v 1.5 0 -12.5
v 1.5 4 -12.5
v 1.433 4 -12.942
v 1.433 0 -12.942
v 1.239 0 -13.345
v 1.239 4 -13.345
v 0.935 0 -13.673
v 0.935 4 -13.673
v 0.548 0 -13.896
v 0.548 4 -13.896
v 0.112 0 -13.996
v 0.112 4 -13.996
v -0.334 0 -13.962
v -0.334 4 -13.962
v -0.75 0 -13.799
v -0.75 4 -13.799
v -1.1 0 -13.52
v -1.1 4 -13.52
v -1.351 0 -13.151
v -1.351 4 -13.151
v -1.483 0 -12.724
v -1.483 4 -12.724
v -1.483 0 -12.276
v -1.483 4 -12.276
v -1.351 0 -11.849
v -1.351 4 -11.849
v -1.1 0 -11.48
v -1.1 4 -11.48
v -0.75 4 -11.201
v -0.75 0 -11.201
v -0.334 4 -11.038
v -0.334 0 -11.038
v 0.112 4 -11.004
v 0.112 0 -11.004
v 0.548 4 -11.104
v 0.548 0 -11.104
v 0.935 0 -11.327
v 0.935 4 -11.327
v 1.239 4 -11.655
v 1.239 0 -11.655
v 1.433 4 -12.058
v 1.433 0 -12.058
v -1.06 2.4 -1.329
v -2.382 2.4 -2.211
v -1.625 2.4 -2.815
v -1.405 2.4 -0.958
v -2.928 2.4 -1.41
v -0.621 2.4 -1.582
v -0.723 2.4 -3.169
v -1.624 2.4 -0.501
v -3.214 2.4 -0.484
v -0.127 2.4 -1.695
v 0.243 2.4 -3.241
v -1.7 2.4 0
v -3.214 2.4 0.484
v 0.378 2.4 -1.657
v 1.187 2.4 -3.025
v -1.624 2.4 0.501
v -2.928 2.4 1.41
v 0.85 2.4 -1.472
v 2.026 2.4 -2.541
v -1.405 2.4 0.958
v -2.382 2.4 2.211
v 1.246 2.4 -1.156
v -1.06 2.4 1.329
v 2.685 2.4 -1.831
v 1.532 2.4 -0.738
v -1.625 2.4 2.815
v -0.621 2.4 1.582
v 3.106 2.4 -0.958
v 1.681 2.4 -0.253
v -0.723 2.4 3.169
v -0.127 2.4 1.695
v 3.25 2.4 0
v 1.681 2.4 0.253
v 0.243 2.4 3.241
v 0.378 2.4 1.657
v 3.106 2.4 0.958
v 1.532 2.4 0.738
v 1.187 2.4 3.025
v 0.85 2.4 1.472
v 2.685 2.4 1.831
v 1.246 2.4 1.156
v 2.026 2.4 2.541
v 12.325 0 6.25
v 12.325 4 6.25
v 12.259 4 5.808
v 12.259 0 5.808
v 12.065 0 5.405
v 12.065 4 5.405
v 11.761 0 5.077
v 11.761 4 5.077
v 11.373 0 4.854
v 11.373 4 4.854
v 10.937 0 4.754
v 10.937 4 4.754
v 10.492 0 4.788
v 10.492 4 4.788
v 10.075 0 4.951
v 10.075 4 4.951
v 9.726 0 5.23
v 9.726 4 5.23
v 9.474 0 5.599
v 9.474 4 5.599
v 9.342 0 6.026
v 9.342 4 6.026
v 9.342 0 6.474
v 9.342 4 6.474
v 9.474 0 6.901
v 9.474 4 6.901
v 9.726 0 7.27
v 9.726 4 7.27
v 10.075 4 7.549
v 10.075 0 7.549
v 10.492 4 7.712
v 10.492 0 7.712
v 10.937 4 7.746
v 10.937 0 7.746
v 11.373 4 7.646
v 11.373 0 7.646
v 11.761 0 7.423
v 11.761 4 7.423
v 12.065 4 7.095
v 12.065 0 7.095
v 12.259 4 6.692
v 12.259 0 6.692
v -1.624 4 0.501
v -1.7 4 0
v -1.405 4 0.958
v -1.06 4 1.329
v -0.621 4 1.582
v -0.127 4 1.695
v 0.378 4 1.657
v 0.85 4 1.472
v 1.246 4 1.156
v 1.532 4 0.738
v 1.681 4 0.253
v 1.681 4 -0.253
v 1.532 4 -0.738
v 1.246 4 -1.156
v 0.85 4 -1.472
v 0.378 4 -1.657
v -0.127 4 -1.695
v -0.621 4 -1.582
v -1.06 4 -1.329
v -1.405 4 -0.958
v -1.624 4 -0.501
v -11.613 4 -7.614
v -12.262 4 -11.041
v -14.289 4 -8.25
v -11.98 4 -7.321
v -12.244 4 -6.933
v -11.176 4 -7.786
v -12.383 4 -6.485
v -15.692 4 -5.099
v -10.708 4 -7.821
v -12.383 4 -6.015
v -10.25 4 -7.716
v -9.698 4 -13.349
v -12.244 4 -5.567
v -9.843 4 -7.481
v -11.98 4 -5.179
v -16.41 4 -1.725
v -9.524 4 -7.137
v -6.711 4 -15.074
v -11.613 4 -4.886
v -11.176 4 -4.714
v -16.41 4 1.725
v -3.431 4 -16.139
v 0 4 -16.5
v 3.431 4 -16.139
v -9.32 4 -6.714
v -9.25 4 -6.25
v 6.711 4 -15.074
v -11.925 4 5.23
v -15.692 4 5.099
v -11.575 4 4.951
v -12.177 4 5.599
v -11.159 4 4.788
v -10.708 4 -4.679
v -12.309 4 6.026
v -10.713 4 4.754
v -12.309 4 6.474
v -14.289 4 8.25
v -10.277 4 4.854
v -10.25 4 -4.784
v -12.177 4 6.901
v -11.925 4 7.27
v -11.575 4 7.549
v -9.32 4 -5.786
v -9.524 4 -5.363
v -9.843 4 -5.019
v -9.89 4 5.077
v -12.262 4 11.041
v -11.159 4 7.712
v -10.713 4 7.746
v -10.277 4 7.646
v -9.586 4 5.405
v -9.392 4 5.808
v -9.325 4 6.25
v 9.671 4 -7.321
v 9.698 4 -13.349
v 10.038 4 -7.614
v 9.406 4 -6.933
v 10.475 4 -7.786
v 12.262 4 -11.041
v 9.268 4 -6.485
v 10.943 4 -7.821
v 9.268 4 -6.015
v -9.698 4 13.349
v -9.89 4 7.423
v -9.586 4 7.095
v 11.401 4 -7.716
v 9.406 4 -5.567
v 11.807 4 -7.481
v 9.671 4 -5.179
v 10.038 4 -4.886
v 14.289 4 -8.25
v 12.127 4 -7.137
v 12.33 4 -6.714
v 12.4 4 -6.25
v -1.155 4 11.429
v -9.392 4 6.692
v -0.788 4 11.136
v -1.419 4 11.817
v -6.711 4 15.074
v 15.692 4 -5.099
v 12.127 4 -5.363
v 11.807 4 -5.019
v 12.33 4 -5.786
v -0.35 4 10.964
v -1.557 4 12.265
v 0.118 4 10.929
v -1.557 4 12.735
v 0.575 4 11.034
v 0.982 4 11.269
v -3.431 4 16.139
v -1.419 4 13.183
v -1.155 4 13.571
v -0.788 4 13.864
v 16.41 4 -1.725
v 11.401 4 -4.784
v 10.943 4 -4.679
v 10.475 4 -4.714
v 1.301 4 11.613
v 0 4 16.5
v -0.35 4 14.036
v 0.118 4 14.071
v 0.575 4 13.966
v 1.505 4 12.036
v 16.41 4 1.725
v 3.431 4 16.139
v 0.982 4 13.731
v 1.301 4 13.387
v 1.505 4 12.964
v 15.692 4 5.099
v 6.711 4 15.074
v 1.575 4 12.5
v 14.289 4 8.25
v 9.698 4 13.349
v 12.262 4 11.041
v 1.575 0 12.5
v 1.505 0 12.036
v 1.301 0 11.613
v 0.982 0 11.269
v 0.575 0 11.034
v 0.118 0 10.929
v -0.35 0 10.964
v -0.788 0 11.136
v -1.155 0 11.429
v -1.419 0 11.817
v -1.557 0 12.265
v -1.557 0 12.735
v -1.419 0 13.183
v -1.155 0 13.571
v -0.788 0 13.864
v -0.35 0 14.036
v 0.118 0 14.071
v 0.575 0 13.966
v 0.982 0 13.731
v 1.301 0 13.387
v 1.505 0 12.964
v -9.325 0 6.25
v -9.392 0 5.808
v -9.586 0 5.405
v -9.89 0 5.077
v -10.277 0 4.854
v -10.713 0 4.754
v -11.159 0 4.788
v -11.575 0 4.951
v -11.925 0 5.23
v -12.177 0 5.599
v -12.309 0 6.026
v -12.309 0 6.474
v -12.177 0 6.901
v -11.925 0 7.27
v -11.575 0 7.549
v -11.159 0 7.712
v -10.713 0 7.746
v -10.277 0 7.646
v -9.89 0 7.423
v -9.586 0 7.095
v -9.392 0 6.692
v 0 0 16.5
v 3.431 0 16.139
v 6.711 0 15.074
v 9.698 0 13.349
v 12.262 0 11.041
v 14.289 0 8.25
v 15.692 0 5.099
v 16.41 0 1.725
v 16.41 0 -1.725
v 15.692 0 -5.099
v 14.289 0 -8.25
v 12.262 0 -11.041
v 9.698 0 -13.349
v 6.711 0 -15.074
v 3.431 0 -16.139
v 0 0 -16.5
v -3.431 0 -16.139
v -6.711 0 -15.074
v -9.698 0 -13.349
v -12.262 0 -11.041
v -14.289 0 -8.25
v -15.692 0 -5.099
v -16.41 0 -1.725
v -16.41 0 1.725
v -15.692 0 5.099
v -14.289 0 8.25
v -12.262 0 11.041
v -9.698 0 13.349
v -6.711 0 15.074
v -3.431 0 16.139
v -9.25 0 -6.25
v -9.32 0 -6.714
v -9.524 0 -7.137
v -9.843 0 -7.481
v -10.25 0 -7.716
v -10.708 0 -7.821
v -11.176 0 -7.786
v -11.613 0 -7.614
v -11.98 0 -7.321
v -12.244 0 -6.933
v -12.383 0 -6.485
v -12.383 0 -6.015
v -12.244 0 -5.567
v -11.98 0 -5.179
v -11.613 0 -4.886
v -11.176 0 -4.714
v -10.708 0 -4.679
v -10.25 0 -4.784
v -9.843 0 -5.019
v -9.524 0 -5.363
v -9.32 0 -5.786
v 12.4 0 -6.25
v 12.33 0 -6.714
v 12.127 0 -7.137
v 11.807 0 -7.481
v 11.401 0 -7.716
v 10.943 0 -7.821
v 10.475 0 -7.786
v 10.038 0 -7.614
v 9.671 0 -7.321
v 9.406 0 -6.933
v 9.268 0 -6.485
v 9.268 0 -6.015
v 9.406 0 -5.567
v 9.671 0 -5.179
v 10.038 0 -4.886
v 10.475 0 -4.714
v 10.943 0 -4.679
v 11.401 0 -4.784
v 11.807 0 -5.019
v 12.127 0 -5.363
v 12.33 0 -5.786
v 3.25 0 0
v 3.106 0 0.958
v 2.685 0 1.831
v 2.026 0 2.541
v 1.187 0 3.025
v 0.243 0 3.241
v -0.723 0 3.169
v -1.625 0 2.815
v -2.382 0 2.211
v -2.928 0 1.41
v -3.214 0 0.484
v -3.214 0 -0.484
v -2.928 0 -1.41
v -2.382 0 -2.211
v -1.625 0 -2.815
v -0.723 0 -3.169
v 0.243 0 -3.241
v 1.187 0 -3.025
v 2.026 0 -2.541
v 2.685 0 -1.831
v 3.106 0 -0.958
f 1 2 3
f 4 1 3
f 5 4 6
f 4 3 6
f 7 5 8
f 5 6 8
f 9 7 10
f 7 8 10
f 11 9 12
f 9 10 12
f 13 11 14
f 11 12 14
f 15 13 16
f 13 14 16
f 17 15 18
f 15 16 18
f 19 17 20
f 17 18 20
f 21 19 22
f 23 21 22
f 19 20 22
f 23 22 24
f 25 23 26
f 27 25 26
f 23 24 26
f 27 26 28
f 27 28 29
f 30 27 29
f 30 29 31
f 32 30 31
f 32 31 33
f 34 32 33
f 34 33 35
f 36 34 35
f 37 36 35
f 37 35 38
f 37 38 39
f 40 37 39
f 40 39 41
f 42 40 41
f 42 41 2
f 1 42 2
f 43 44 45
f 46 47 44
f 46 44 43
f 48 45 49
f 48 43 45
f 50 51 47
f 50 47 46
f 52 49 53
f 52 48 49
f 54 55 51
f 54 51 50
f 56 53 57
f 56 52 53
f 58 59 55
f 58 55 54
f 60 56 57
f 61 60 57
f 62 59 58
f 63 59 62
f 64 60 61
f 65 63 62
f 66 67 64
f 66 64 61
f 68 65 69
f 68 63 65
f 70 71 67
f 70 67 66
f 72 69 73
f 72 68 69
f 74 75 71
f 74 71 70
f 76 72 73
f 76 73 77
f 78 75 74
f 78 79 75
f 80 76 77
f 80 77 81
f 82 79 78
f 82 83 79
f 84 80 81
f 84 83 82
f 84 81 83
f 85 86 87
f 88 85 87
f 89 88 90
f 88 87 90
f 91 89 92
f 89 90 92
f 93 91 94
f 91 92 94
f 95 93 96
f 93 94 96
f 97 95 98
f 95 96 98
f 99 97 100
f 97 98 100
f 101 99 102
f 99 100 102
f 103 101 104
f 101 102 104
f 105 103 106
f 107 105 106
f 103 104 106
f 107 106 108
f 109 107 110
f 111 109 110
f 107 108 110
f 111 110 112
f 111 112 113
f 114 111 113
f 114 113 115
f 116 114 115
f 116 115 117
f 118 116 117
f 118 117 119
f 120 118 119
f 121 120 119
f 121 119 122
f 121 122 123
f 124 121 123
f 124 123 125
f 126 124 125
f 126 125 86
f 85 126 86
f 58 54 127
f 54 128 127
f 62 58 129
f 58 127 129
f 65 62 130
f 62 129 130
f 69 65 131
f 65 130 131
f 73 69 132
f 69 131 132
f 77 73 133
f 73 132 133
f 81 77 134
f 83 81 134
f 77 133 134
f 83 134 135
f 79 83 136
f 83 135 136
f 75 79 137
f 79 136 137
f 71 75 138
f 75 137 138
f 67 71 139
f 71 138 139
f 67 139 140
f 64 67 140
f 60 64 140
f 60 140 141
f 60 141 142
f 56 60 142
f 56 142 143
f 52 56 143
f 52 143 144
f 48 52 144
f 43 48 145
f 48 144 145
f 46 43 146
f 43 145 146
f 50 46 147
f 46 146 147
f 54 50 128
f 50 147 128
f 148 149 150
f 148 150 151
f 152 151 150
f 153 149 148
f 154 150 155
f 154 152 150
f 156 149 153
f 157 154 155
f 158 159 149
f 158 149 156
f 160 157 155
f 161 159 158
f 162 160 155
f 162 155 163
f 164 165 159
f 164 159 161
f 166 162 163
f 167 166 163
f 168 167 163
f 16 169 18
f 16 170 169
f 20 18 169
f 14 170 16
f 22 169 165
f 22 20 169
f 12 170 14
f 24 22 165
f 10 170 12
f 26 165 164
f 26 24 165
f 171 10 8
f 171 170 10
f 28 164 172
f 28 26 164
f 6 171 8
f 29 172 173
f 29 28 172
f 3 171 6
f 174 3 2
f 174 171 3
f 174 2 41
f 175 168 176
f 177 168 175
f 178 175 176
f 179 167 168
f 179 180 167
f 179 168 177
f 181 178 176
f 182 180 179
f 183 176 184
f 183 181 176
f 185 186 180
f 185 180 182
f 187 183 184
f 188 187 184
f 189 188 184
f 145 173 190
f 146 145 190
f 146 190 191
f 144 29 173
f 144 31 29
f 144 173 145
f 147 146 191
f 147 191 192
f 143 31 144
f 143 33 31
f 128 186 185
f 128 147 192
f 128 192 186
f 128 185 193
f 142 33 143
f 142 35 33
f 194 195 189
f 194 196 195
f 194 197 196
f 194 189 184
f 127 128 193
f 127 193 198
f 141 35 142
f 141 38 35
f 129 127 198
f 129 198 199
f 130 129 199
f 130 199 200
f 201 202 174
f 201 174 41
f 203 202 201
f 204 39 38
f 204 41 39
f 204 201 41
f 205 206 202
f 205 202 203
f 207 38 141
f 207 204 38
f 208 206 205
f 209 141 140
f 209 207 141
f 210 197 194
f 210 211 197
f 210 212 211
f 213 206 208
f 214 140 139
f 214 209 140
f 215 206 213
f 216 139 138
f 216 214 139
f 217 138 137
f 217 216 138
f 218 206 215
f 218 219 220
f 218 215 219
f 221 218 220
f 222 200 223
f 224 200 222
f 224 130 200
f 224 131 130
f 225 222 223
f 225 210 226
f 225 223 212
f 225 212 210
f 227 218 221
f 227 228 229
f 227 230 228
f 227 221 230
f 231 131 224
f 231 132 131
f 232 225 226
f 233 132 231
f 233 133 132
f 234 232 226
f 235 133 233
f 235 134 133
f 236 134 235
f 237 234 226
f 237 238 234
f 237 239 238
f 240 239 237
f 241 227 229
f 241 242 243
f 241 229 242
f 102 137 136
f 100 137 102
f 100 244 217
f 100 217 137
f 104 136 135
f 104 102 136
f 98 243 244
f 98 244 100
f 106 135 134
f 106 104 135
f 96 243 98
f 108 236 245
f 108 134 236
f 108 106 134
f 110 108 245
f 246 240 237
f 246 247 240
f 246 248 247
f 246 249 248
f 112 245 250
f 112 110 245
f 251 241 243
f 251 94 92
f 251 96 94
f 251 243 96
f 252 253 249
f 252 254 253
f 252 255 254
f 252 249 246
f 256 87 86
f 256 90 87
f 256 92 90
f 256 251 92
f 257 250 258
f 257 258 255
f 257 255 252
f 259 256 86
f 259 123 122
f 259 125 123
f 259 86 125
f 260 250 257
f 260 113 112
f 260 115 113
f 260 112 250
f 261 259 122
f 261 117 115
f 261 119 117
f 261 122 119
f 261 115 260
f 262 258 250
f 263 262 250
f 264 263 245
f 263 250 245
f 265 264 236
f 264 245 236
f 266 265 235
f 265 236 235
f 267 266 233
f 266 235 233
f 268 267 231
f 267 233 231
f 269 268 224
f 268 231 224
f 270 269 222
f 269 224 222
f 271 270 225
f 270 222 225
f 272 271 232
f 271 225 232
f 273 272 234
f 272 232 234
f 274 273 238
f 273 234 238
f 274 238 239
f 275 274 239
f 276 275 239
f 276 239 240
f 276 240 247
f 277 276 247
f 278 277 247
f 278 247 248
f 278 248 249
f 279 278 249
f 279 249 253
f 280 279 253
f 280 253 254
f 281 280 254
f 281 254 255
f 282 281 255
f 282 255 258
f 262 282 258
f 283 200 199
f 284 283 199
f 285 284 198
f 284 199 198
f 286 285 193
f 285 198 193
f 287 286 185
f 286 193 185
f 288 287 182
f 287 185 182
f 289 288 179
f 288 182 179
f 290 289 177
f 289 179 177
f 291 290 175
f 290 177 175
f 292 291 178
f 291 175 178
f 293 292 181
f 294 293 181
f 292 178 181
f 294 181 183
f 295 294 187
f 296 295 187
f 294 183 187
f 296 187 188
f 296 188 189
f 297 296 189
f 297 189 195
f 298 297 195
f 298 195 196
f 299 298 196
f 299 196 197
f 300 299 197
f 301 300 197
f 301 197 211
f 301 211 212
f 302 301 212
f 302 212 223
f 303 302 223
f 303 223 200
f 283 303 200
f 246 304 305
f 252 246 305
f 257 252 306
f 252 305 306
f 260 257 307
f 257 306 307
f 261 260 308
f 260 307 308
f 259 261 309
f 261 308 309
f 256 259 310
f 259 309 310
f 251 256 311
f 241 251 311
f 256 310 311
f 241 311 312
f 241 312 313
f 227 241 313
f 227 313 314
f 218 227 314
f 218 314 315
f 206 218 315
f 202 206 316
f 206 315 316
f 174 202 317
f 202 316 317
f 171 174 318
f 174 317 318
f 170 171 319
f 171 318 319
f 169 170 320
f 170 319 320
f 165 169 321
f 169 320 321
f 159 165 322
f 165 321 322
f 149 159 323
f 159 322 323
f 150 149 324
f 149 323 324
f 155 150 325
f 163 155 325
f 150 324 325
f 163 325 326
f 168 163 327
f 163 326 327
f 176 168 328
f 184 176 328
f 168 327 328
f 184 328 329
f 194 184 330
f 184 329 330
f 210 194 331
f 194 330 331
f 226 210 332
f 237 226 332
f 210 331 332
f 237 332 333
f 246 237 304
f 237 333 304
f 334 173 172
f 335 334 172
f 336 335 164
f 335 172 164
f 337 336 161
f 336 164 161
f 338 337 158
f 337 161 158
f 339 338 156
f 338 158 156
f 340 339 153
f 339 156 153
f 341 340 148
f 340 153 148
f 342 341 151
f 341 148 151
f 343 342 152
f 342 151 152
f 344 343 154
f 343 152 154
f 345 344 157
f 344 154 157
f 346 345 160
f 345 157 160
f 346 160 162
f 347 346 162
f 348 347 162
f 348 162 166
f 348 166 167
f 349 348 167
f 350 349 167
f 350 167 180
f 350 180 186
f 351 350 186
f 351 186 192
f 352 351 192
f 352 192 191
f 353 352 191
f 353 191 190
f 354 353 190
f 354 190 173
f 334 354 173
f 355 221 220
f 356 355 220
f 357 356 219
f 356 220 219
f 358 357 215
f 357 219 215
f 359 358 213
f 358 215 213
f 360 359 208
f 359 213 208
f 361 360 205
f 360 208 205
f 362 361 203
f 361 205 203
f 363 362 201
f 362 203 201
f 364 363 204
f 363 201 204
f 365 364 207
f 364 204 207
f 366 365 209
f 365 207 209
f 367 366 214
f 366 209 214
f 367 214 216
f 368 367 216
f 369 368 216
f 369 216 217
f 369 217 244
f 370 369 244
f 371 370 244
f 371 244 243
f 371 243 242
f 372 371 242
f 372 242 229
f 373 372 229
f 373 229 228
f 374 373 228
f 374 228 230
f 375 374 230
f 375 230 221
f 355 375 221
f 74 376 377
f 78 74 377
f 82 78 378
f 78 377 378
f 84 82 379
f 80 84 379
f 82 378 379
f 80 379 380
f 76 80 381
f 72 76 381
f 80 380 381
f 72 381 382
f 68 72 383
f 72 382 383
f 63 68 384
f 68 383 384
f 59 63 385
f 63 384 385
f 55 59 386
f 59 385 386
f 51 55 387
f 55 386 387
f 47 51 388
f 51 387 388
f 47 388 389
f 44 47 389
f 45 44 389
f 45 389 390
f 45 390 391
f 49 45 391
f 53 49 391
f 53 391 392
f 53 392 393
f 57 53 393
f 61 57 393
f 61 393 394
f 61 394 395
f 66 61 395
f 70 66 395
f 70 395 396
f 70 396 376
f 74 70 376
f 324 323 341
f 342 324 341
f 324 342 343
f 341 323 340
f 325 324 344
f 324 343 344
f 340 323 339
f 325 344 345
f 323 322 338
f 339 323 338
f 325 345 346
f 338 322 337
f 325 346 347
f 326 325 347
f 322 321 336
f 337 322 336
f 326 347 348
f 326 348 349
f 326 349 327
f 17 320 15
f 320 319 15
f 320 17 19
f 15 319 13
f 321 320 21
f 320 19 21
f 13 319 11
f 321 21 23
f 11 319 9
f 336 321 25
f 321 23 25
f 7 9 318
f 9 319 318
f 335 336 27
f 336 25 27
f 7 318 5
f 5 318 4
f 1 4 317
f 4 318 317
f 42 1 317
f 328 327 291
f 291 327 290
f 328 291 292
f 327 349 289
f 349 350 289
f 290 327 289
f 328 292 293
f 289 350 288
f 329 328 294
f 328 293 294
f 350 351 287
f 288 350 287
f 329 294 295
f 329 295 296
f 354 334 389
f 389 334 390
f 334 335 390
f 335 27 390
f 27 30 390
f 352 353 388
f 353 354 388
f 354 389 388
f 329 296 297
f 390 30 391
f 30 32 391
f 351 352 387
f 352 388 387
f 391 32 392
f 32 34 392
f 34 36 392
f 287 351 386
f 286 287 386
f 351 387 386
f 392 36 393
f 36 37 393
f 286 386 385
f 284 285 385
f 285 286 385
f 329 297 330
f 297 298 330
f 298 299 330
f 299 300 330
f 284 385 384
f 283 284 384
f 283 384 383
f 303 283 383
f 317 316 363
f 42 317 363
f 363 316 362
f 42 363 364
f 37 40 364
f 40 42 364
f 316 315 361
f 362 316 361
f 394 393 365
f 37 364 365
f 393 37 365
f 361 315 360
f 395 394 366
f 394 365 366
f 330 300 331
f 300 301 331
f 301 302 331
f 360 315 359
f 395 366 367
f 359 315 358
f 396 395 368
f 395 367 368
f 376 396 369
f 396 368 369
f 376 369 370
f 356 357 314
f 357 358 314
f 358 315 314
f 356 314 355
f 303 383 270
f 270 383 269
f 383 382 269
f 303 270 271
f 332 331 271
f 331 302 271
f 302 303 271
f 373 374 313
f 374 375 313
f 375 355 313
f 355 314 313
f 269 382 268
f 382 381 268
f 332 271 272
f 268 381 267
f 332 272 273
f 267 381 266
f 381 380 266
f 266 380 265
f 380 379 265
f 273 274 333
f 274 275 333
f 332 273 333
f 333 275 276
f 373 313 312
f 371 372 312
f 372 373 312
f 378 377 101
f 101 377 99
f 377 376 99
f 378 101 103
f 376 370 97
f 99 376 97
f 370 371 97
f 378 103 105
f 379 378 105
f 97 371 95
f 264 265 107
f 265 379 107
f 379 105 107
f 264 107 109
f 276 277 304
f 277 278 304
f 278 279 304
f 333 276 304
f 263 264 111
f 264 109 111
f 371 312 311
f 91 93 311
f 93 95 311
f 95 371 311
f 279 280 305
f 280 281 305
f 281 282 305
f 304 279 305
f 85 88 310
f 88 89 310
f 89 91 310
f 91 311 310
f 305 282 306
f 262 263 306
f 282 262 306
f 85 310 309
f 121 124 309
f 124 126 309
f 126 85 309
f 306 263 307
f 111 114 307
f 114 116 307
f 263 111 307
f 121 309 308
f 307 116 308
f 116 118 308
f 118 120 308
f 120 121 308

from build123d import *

# Parameters (mm, degrees)
SKETCH1_R                                            = 16.5
BOSS_EXTRUDE1_DEPTH                                  = 4
CBORE_FOR_M3_HEX_SOCKET_THIN_HEAD_CAP_SC_D           = 3.4
CBORE_FOR_M3_HEX_SOCKET_THIN_HEAD_CAP_SC_CBORE_D     = 6.5
CBORE_FOR_M3_HEX_SOCKET_THIN_HEAD_CAP_SC_CBORE_DEPTH = 2.4
F_3_0MM_DOWEL_HOLE1_D                                = 3
F_3_0MM_DOWEL_HOLE1_DEPTH                            = 6
F_3_0MM_DOWEL_HOLE1_TIP                              = 0.901290929
TAP_DRILL_FOR_M3_HELICOIL1_D                         = 3.15


with BuildPart() as part:
    # Sketch1 → Boss-Extrude1 (new body)
    with BuildSketch(Plane(origin=(0, 0, 0), x_dir=(1, 0, 0), z_dir=(0, 1, 0))):
        with Locations(Location((0, 0, 0), (0, 0, 270))):
            Circle(SKETCH1_R)
    extrude(amount=BOSS_EXTRUDE1_DEPTH)

    # CBORE for M3 Hex Socket Thin Head Cap Screw1 (through all)
    with Locations(Plane.XZ):
        with Locations((0, 0)):
            CounterBoreHole(CBORE_FOR_M3_HEX_SOCKET_THIN_HEAD_CAP_SC_D / 2, CBORE_FOR_M3_HEX_SOCKET_THIN_HEAD_CAP_SC_CBORE_D / 2, CBORE_FOR_M3_HEX_SOCKET_THIN_HEAD_CAP_SC_CBORE_DEPTH)

    # Ø3.0mm Dowel Hole1
    with Locations(Plane(origin=(0, 0, 0), x_dir=(-1, 0, 0), z_dir=(0, -1, 0))):
        with Locations((-10.825317547, -6.25), (0, 12.5), (10.825317547, -6.25)):
            Hole(F_3_0MM_DOWEL_HOLE1_D / 2, depth=F_3_0MM_DOWEL_HOLE1_DEPTH)
            with Locations((0, 0, -(F_3_0MM_DOWEL_HOLE1_DEPTH + F_3_0MM_DOWEL_HOLE1_TIP / 2))):  # 118° drill point
                Cone(0, F_3_0MM_DOWEL_HOLE1_D / 2, F_3_0MM_DOWEL_HOLE1_TIP, mode=Mode.SUBTRACT)

    # Tap Drill for M3 Helicoil1 (through all)
    with Locations(Plane(origin=(0, 0, 0), x_dir=(-1, 0, 0), z_dir=(0, -1, 0))):
        with Locations((10.825317547, 6.25), (0, -12.5), (-10.825317547, 6.25)):
            Hole(TAP_DRILL_FOR_M3_HELICOIL1_D / 2)


solid = part.part
